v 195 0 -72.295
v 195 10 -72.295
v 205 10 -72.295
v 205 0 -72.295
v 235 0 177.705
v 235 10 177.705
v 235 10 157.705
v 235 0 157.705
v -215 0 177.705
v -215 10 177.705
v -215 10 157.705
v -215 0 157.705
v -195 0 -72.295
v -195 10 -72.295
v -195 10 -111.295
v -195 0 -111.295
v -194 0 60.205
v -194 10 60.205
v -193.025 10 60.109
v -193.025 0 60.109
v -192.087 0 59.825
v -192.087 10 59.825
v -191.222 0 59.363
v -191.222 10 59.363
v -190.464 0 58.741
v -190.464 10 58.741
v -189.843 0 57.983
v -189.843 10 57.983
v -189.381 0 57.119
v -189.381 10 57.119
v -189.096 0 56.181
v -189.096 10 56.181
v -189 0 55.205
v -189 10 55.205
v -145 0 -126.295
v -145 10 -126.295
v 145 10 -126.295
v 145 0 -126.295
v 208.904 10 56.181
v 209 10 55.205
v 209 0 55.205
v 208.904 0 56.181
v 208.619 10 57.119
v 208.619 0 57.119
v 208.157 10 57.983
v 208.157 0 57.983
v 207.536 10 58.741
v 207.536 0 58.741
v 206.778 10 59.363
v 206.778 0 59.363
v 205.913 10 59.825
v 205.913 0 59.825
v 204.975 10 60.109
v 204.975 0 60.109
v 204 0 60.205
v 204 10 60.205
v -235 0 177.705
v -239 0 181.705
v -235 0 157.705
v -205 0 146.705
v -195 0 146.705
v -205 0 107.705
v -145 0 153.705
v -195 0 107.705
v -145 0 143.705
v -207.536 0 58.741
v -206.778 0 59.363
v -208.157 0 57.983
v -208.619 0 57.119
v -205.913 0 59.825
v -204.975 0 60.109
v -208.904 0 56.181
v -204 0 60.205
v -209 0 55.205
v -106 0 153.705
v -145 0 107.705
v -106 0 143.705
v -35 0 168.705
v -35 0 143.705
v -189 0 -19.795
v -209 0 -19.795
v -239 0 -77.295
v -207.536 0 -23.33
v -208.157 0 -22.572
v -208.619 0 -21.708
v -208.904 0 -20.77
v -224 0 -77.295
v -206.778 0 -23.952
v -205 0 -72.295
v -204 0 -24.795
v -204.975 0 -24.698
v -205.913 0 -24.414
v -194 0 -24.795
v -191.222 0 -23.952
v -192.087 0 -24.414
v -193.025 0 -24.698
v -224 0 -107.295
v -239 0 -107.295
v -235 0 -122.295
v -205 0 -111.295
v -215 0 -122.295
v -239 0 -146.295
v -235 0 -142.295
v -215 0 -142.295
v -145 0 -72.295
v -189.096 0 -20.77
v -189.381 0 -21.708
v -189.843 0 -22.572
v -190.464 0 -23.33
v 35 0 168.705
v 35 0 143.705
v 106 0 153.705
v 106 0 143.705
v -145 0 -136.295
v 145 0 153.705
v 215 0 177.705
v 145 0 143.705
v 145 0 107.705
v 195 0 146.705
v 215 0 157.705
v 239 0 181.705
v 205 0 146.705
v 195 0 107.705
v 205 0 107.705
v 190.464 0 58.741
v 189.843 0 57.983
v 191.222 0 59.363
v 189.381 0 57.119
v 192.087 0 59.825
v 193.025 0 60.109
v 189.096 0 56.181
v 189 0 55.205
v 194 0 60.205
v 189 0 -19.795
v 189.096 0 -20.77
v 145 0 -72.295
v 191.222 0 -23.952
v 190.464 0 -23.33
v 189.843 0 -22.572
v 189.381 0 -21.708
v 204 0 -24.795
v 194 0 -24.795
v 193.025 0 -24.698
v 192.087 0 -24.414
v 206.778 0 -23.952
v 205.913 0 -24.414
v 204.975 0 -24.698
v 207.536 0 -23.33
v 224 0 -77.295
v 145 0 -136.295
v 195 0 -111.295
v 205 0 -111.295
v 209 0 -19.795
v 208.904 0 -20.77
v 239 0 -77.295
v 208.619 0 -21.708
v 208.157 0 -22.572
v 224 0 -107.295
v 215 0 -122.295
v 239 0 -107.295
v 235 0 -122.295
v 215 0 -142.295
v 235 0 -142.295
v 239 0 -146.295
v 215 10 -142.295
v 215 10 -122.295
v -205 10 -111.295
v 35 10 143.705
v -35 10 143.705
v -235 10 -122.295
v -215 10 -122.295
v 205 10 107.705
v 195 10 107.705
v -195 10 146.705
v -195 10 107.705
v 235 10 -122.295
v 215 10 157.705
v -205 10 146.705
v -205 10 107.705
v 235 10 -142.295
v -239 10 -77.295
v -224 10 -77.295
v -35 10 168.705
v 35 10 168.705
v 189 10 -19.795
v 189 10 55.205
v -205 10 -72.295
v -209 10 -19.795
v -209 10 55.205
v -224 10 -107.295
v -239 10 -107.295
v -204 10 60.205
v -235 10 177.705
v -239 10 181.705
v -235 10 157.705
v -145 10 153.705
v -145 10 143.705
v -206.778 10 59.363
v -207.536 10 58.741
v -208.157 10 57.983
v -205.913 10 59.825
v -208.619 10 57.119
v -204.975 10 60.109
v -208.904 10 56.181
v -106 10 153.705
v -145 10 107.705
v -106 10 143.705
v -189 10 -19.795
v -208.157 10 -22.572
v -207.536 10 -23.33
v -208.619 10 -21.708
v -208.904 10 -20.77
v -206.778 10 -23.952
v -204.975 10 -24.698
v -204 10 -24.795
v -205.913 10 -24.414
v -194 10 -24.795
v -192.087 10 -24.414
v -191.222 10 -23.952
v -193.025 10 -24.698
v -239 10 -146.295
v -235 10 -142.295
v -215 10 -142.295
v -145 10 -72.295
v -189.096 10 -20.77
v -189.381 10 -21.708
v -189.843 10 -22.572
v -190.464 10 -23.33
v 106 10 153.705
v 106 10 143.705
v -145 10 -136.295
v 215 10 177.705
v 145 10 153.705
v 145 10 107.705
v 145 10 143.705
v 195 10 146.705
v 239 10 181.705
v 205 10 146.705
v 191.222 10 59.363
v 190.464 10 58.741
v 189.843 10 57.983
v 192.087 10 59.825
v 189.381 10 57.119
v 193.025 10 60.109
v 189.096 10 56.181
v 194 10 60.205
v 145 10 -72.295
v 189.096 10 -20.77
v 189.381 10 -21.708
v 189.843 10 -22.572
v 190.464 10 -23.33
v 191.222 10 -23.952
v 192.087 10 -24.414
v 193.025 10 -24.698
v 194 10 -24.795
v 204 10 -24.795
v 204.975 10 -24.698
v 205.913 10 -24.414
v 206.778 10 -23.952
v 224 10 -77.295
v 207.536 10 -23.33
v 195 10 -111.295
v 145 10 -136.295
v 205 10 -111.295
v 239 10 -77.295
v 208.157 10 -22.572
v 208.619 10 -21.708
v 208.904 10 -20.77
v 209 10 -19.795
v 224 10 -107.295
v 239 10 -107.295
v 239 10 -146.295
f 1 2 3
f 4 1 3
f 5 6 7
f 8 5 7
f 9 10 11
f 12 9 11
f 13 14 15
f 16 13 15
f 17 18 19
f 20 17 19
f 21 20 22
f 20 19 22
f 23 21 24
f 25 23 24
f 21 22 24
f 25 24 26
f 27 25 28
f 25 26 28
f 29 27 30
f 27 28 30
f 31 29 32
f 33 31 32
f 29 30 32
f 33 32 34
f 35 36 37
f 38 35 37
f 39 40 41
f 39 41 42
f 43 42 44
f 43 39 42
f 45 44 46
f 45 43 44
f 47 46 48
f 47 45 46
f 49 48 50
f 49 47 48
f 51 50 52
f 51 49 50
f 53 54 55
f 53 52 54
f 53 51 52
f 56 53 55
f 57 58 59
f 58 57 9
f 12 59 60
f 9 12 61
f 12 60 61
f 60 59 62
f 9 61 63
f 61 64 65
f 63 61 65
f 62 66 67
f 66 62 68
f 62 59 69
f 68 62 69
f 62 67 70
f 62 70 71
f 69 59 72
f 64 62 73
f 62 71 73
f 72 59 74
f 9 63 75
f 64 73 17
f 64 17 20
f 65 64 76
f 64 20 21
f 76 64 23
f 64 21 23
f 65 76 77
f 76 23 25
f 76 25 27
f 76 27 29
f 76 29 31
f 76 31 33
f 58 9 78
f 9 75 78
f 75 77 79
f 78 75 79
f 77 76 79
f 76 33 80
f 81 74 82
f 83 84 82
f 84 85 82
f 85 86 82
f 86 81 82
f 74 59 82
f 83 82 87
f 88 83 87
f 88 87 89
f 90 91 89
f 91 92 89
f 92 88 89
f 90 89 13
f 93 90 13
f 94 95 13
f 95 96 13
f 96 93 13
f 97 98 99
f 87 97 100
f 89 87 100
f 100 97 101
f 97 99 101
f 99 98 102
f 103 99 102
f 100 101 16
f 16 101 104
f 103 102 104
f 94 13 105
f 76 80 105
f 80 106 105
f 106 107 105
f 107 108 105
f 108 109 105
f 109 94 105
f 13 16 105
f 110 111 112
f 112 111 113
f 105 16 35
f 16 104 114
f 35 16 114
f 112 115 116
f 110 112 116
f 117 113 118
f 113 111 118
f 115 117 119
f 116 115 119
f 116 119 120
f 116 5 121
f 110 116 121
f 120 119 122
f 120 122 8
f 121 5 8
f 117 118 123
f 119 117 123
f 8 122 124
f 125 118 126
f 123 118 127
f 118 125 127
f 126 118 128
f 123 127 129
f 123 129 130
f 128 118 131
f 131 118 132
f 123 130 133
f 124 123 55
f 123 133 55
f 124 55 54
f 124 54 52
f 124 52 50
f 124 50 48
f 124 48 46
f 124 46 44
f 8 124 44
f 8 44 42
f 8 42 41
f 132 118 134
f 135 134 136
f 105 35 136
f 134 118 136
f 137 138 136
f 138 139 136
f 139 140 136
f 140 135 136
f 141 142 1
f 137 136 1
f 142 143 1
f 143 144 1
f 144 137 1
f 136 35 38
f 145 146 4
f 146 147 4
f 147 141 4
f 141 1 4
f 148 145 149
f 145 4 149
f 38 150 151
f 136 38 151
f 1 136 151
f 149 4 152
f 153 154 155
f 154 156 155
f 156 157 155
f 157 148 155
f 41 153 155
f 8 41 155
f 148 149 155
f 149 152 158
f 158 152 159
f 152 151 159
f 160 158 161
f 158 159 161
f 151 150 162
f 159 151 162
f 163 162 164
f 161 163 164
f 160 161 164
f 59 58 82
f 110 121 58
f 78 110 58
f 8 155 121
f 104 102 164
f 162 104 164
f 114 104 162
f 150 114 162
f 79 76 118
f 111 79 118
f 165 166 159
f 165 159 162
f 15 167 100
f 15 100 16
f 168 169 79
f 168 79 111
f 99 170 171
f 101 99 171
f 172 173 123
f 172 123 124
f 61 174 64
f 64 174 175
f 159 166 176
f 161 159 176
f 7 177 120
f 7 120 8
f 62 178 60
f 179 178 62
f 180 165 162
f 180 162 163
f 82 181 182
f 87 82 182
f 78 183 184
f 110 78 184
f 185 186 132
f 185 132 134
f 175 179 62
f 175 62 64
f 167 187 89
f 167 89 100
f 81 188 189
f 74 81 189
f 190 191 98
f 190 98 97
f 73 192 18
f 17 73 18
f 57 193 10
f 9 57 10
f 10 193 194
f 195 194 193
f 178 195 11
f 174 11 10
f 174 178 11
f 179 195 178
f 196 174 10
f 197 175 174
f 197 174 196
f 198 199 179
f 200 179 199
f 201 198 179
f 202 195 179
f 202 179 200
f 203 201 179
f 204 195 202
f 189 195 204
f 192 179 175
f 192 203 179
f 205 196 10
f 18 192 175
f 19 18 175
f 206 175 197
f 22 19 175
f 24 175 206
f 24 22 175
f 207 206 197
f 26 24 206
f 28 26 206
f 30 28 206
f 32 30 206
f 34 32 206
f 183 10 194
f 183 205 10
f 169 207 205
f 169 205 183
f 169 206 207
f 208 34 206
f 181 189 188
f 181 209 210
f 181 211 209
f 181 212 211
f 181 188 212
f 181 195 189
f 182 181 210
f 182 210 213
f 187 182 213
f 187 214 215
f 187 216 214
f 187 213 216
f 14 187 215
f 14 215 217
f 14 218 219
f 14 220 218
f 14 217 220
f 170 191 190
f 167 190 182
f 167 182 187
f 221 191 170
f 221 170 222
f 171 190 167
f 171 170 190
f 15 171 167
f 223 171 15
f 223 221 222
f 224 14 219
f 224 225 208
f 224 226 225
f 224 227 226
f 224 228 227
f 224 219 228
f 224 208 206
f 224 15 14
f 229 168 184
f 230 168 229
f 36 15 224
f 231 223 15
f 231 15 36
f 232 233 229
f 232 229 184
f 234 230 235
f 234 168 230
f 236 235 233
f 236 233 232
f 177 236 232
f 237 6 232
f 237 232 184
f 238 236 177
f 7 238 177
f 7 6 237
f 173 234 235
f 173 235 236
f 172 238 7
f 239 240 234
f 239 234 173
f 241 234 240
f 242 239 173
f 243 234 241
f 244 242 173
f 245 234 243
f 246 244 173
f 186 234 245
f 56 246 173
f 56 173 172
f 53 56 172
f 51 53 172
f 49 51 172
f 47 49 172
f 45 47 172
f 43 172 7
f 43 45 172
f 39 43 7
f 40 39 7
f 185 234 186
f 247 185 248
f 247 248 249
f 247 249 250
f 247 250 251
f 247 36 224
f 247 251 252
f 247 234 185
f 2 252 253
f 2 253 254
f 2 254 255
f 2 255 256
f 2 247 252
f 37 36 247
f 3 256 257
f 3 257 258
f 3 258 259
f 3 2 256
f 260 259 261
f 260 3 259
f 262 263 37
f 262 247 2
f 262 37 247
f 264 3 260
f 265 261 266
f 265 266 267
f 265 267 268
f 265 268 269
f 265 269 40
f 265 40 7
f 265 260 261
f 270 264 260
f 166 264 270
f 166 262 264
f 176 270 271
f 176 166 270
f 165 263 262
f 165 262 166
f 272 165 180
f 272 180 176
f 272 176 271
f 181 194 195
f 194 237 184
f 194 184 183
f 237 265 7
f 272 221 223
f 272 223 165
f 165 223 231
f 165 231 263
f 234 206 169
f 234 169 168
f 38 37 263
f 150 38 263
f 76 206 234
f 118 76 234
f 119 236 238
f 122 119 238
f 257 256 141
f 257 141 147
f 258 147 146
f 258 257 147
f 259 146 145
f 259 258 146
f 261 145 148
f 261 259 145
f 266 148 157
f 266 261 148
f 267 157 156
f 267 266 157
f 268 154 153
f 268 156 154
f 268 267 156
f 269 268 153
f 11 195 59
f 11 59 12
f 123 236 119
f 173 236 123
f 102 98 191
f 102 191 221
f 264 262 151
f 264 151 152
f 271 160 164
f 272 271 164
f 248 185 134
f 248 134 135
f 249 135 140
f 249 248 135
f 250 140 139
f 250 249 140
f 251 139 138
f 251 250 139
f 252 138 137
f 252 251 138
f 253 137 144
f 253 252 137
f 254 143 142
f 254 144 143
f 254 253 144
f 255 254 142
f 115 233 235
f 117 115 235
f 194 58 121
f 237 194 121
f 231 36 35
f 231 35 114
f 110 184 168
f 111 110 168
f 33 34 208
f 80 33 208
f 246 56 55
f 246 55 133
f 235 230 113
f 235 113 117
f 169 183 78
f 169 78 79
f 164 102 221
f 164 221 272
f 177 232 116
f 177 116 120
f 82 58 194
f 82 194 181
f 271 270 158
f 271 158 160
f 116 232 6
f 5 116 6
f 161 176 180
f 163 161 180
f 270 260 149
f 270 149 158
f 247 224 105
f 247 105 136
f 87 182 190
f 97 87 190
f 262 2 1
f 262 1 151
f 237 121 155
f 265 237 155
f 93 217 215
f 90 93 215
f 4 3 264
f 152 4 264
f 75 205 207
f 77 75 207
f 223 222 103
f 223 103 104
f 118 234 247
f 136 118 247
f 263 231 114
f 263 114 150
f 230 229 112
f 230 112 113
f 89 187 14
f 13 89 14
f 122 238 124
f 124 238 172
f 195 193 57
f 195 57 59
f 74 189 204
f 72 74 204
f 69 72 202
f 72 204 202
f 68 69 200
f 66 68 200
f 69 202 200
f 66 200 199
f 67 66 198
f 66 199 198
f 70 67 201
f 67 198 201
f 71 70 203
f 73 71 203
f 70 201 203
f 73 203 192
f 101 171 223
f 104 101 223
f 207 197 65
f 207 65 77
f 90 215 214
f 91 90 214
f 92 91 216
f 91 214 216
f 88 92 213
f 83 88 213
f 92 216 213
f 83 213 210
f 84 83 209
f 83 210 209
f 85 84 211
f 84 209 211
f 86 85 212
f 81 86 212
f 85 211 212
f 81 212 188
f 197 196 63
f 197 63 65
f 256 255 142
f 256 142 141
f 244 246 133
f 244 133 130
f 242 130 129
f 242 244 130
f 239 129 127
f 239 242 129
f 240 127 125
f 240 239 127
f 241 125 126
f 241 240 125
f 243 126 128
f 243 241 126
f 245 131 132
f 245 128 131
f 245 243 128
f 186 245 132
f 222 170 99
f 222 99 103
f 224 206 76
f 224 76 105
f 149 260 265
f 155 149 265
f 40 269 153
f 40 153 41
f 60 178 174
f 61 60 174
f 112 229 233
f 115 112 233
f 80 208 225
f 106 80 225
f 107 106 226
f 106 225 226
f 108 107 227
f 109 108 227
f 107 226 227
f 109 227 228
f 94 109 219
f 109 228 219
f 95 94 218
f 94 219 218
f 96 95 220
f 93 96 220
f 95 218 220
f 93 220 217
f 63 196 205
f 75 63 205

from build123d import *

# Parameters (mm, degrees)
SKETCH1_W           = 478
SKETCH1_H           = 328
BOSS_EXTRUDE1_DEPTH = 10
CUT_EXTRUDE1_REACH  = 302.396
SKETCH2_W           = 20
SKETCH2_H           = 20
CUT_EXTRUDE2_REACH  = 302.396
SKETCH3_W           = 290
SKETCH3_H           = 10
SKETCH3_W_2         = 10
SKETCH3_H_2         = 39
SKETCH3_W_3         = 39
SKETCH3_W_4         = 70
SKETCH3_H_3         = 25
SKETCH3_H_4         = 180
SKETCH3_W_5         = 15
SKETCH3_H_5         = 30


with BuildPart() as part:
    # Sketch1 → Boss-Extrude1 (new body)
    with BuildSketch(Plane(origin=(0, 0, 0), x_dir=(1, 0, 0), z_dir=(0, 1, 0))):
        with Locations((0, -17.705479187)):
            Rectangle(SKETCH1_W, SKETCH1_H)
    extrude(amount=BOSS_EXTRUDE1_DEPTH)

    # Sketch2 → Cut-Extrude1 (cut, up to next)
    with BuildSketch(Plane(origin=(0, 10, 0), x_dir=(1, 0, 0), z_dir=(0, 1, 0)), mode=Mode.PRIVATE) as cut_extrude1_sk1:
        with Locations((-225, 132.294520813)):
            Rectangle(SKETCH2_W, SKETCH2_H)
    cut_extrude1_tool1 = extrude(cut_extrude1_sk1.sketch, amount=-CUT_EXTRUDE1_REACH, mode=Mode.PRIVATE) & part.part
    # Sketch2 → Cut-Extrude1 (cut, up to next)
    with BuildSketch(Plane(origin=(0, 10, 0), x_dir=(1, 0, 0), z_dir=(0, 1, 0)), mode=Mode.PRIVATE) as cut_extrude1_sk2:
        with Locations((-225, -167.705479187)):
            Rectangle(SKETCH2_W, SKETCH2_H)
    cut_extrude1_tool2 = extrude(cut_extrude1_sk2.sketch, amount=-CUT_EXTRUDE1_REACH, mode=Mode.PRIVATE) & part.part
    # Sketch2 → Cut-Extrude1 (cut, up to next)
    with BuildSketch(Plane(origin=(0, 10, 0), x_dir=(1, 0, 0), z_dir=(0, 1, 0)), mode=Mode.PRIVATE) as cut_extrude1_sk3:
        with Locations((225, 132.294520813)):
            Rectangle(SKETCH2_W, SKETCH2_H)
    cut_extrude1_tool3 = extrude(cut_extrude1_sk3.sketch, amount=-CUT_EXTRUDE1_REACH, mode=Mode.PRIVATE) & part.part
    # Sketch2 → Cut-Extrude1 (cut, up to next)
    with BuildSketch(Plane(origin=(0, 10, 0), x_dir=(1, 0, 0), z_dir=(0, 1, 0)), mode=Mode.PRIVATE) as cut_extrude1_sk4:
        with Locations((225, -167.705479187)):
            Rectangle(SKETCH2_W, SKETCH2_H)
    cut_extrude1_tool4 = extrude(cut_extrude1_sk4.sketch, amount=-CUT_EXTRUDE1_REACH, mode=Mode.PRIVATE) & part.part
    add(cut_extrude1_tool1.solids().sort_by_distance((-225, 10, -132.294521))[0], mode=Mode.SUBTRACT)
    add(cut_extrude1_tool2.solids().sort_by_distance((-225, 10, 167.705479))[0], mode=Mode.SUBTRACT)
    add(cut_extrude1_tool3.solids().sort_by_distance((225, 10, -132.294521))[0], mode=Mode.SUBTRACT)
    add(cut_extrude1_tool4.solids().sort_by_distance((225, 10, 167.705479))[0], mode=Mode.SUBTRACT)

    # Sketch3 → Cut-Extrude2 (cut, up to next)
    with BuildSketch(Plane(origin=(0, 10, 0), x_dir=(1, 0, 0), z_dir=(0, 1, 0)), mode=Mode.PRIVATE) as cut_extrude2_sk1:
        with Locations((0, 131.294520813)):
            Rectangle(SKETCH3_W, SKETCH3_H)
    cut_extrude2_tool1 = extrude(cut_extrude2_sk1.sketch, amount=-CUT_EXTRUDE2_REACH, mode=Mode.PRIVATE) & part.part
    # Sketch3 → Cut-Extrude2 (cut, up to next)
    with BuildSketch(Plane(origin=(0, 10, 0), x_dir=(1, 0, 0), z_dir=(0, 1, 0)), mode=Mode.PRIVATE) as cut_extrude2_sk2:
        with Locations((-200, 91.794520813)):
            Rectangle(SKETCH3_W_2, SKETCH3_H_2)
    cut_extrude2_tool2 = extrude(cut_extrude2_sk2.sketch, amount=-CUT_EXTRUDE2_REACH, mode=Mode.PRIVATE) & part.part
    # Sketch3 → Cut-Extrude2 (cut, up to next)
    with BuildSketch(Plane(origin=(0, 10, 0), x_dir=(1, 0, 0), z_dir=(0, 1, 0)), mode=Mode.PRIVATE) as cut_extrude2_sk3:
        with Locations((200, 91.794520813)):
            Rectangle(SKETCH3_W_2, SKETCH3_H_2)
    cut_extrude2_tool3 = extrude(cut_extrude2_sk3.sketch, amount=-CUT_EXTRUDE2_REACH, mode=Mode.PRIVATE) & part.part
    # Sketch3 → Cut-Extrude2 (cut, up to next)
    with BuildSketch(Plane(origin=(0, 10, 0), x_dir=(1, 0, 0), z_dir=(0, 1, 0)), mode=Mode.PRIVATE) as cut_extrude2_sk4:
        with Locations((200, -127.205479187)):
            Rectangle(SKETCH3_W_2, SKETCH3_H_2)
    cut_extrude2_tool4 = extrude(cut_extrude2_sk4.sketch, amount=-CUT_EXTRUDE2_REACH, mode=Mode.PRIVATE) & part.part
    # Sketch3 → Cut-Extrude2 (cut, up to next)
    with BuildSketch(Plane(origin=(0, 10, 0), x_dir=(1, 0, 0), z_dir=(0, 1, 0)), mode=Mode.PRIVATE) as cut_extrude2_sk5:
        with Locations((-200, -127.205479187)):
            Rectangle(SKETCH3_W_2, SKETCH3_H_2)
    cut_extrude2_tool5 = extrude(cut_extrude2_sk5.sketch, amount=-CUT_EXTRUDE2_REACH, mode=Mode.PRIVATE) & part.part
    # Sketch3 → Cut-Extrude2 (cut, up to next)
    with BuildSketch(Plane(origin=(0, 10, 0), x_dir=(1, 0, 0), z_dir=(0, 1, 0)), mode=Mode.PRIVATE) as cut_extrude2_sk6:
        with Locations((-125.5, -148.705479187)):
            Rectangle(SKETCH3_W_3, SKETCH3_H)
    cut_extrude2_tool6 = extrude(cut_extrude2_sk6.sketch, amount=-CUT_EXTRUDE2_REACH, mode=Mode.PRIVATE) & part.part
    # Sketch3 → Cut-Extrude2 (cut, up to next)
    with BuildSketch(Plane(origin=(0, 10, 0), x_dir=(1, 0, 0), z_dir=(0, 1, 0)), mode=Mode.PRIVATE) as cut_extrude2_sk7:
        with Locations((125.5, -148.705479187)):
            Rectangle(SKETCH3_W_3, SKETCH3_H)
    cut_extrude2_tool7 = extrude(cut_extrude2_sk7.sketch, amount=-CUT_EXTRUDE2_REACH, mode=Mode.PRIVATE) & part.part
    # Sketch3 → Cut-Extrude2 (cut, up to next)
    with BuildSketch(Plane(origin=(0, 10, 0), x_dir=(1, 0, 0), z_dir=(0, 1, 0)), mode=Mode.PRIVATE) as cut_extrude2_sk8:
        with Locations((0, -156.205479187)):
            Rectangle(SKETCH3_W_4, SKETCH3_H_3)
    cut_extrude2_tool8 = extrude(cut_extrude2_sk8.sketch, amount=-CUT_EXTRUDE2_REACH, mode=Mode.PRIVATE) & part.part
    # Sketch3 → Cut-Extrude2 (cut, up to next)
    with BuildSketch(Plane(origin=(0, 10, 0), x_dir=(1, 0, 0), z_dir=(0, 1, 0)), mode=Mode.PRIVATE) as cut_extrude2_sk9:
        with BuildLine():
            Line((-204, -60.205479187), (-194, -60.205479187))
            ThreePointArc((-194, -60.205479187), (-190.464466094, -58.741013093), (-189, -55.205479187))
            Line((-189, -55.205479187), (-189, 19.794520813))
            ThreePointArc((-189, 19.794520813), (-190.464466094, 23.330054719), (-194, 24.794520813))
            Line((-194, 24.794520813), (-204, 24.794520813))
            ThreePointArc((-204, 24.794520813), (-207.535533906, 23.330054719), (-209, 19.794520813))
            Line((-209, 19.794520813), (-209, -55.205479187))
            ThreePointArc((-209, -55.205479187), (-207.535533906, -58.741013093), (-204, -60.205479187))
        make_face()
    cut_extrude2_tool9 = extrude(cut_extrude2_sk9.sketch, amount=-CUT_EXTRUDE2_REACH, mode=Mode.PRIVATE) & part.part
    # Sketch3 → Cut-Extrude2 (cut, up to next)
    with BuildSketch(Plane(origin=(0, 10, 0), x_dir=(1, 0, 0), z_dir=(0, 1, 0)), mode=Mode.PRIVATE) as cut_extrude2_sk10:
        with BuildLine():
            Line((189, -55.205479187), (189, 19.794520813))
            ThreePointArc((189, 19.794520813), (190.464466094, 23.330054719), (194, 24.794520813))
            Line((194, 24.794520813), (204, 24.794520813))
            ThreePointArc((204, 24.794520813), (207.535533906, 23.330054719), (209, 19.794520813))
            Line((209, 19.794520813), (209, -55.205479187))
            ThreePointArc((209, -55.205479187), (207.535533906, -58.741013093), (204, -60.205479187))
            Line((204, -60.205479187), (194, -60.205479187))
            ThreePointArc((194, -60.205479187), (190.464466094, -58.741013093), (189, -55.205479187))
        make_face()
    cut_extrude2_tool10 = extrude(cut_extrude2_sk10.sketch, amount=-CUT_EXTRUDE2_REACH, mode=Mode.PRIVATE) & part.part
    # Sketch3 → Cut-Extrude2 (cut, up to next)
    with BuildSketch(Plane(origin=(0, 10, 0), x_dir=(1, 0, 0), z_dir=(0, 1, 0)), mode=Mode.PRIVATE) as cut_extrude2_sk11:
        with Locations((0, -17.705479187)):
            Rectangle(SKETCH3_W, SKETCH3_H_4)
    cut_extrude2_tool11 = extrude(cut_extrude2_sk11.sketch, amount=-CUT_EXTRUDE2_REACH, mode=Mode.PRIVATE) & part.part
    # Sketch3 → Cut-Extrude2 (cut, up to next)
    with BuildSketch(Plane(origin=(0, 10, 0), x_dir=(1, 0, 0), z_dir=(0, 1, 0)), mode=Mode.PRIVATE) as cut_extrude2_sk12:
        with Locations((-231.5, 92.294520813)):
            Rectangle(SKETCH3_W_5, SKETCH3_H_5)
    cut_extrude2_tool12 = extrude(cut_extrude2_sk12.sketch, amount=-CUT_EXTRUDE2_REACH, mode=Mode.PRIVATE) & part.part
    # Sketch3 → Cut-Extrude2 (cut, up to next)
    with BuildSketch(Plane(origin=(0, 10, 0), x_dir=(1, 0, 0), z_dir=(0, 1, 0)), mode=Mode.PRIVATE) as cut_extrude2_sk13:
        with Locations((231.5, 92.294520813)):
            Rectangle(SKETCH3_W_5, SKETCH3_H_5)
    cut_extrude2_tool13 = extrude(cut_extrude2_sk13.sketch, amount=-CUT_EXTRUDE2_REACH, mode=Mode.PRIVATE) & part.part
    add(cut_extrude2_tool1.solids().sort_by_distance((0, 10, -131.294521))[0], mode=Mode.SUBTRACT)
    add(cut_extrude2_tool2.solids().sort_by_distance((-200, 10, -91.794521))[0], mode=Mode.SUBTRACT)
    add(cut_extrude2_tool3.solids().sort_by_distance((200, 10, -91.794521))[0], mode=Mode.SUBTRACT)
    add(cut_extrude2_tool4.solids().sort_by_distance((200, 10, 127.205479))[0], mode=Mode.SUBTRACT)
    add(cut_extrude2_tool5.solids().sort_by_distance((-200, 10, 127.205479))[0], mode=Mode.SUBTRACT)
    add(cut_extrude2_tool6.solids().sort_by_distance((-125.5, 10, 148.705479))[0], mode=Mode.SUBTRACT)
    add(cut_extrude2_tool7.solids().sort_by_distance((125.5, 10, 148.705479))[0], mode=Mode.SUBTRACT)
    add(cut_extrude2_tool8.solids().sort_by_distance((0, 10, 156.205479))[0], mode=Mode.SUBTRACT)
    add(cut_extrude2_tool9.solids().sort_by_distance((-199, 10, 17.705479))[0], mode=Mode.SUBTRACT)
    add(cut_extrude2_tool10.solids().sort_by_distance((199, 10, 17.705479))[0], mode=Mode.SUBTRACT)
    add(cut_extrude2_tool11.solids().sort_by_distance((0, 10, 17.705479))[0], mode=Mode.SUBTRACT)
    add(cut_extrude2_tool12.solids().sort_by_distance((-231.5, 10, -92.294521))[0], mode=Mode.SUBTRACT)
    add(cut_extrude2_tool13.solids().sort_by_distance((231.5, 10, -92.294521))[0], mode=Mode.SUBTRACT)


solid = part.part
